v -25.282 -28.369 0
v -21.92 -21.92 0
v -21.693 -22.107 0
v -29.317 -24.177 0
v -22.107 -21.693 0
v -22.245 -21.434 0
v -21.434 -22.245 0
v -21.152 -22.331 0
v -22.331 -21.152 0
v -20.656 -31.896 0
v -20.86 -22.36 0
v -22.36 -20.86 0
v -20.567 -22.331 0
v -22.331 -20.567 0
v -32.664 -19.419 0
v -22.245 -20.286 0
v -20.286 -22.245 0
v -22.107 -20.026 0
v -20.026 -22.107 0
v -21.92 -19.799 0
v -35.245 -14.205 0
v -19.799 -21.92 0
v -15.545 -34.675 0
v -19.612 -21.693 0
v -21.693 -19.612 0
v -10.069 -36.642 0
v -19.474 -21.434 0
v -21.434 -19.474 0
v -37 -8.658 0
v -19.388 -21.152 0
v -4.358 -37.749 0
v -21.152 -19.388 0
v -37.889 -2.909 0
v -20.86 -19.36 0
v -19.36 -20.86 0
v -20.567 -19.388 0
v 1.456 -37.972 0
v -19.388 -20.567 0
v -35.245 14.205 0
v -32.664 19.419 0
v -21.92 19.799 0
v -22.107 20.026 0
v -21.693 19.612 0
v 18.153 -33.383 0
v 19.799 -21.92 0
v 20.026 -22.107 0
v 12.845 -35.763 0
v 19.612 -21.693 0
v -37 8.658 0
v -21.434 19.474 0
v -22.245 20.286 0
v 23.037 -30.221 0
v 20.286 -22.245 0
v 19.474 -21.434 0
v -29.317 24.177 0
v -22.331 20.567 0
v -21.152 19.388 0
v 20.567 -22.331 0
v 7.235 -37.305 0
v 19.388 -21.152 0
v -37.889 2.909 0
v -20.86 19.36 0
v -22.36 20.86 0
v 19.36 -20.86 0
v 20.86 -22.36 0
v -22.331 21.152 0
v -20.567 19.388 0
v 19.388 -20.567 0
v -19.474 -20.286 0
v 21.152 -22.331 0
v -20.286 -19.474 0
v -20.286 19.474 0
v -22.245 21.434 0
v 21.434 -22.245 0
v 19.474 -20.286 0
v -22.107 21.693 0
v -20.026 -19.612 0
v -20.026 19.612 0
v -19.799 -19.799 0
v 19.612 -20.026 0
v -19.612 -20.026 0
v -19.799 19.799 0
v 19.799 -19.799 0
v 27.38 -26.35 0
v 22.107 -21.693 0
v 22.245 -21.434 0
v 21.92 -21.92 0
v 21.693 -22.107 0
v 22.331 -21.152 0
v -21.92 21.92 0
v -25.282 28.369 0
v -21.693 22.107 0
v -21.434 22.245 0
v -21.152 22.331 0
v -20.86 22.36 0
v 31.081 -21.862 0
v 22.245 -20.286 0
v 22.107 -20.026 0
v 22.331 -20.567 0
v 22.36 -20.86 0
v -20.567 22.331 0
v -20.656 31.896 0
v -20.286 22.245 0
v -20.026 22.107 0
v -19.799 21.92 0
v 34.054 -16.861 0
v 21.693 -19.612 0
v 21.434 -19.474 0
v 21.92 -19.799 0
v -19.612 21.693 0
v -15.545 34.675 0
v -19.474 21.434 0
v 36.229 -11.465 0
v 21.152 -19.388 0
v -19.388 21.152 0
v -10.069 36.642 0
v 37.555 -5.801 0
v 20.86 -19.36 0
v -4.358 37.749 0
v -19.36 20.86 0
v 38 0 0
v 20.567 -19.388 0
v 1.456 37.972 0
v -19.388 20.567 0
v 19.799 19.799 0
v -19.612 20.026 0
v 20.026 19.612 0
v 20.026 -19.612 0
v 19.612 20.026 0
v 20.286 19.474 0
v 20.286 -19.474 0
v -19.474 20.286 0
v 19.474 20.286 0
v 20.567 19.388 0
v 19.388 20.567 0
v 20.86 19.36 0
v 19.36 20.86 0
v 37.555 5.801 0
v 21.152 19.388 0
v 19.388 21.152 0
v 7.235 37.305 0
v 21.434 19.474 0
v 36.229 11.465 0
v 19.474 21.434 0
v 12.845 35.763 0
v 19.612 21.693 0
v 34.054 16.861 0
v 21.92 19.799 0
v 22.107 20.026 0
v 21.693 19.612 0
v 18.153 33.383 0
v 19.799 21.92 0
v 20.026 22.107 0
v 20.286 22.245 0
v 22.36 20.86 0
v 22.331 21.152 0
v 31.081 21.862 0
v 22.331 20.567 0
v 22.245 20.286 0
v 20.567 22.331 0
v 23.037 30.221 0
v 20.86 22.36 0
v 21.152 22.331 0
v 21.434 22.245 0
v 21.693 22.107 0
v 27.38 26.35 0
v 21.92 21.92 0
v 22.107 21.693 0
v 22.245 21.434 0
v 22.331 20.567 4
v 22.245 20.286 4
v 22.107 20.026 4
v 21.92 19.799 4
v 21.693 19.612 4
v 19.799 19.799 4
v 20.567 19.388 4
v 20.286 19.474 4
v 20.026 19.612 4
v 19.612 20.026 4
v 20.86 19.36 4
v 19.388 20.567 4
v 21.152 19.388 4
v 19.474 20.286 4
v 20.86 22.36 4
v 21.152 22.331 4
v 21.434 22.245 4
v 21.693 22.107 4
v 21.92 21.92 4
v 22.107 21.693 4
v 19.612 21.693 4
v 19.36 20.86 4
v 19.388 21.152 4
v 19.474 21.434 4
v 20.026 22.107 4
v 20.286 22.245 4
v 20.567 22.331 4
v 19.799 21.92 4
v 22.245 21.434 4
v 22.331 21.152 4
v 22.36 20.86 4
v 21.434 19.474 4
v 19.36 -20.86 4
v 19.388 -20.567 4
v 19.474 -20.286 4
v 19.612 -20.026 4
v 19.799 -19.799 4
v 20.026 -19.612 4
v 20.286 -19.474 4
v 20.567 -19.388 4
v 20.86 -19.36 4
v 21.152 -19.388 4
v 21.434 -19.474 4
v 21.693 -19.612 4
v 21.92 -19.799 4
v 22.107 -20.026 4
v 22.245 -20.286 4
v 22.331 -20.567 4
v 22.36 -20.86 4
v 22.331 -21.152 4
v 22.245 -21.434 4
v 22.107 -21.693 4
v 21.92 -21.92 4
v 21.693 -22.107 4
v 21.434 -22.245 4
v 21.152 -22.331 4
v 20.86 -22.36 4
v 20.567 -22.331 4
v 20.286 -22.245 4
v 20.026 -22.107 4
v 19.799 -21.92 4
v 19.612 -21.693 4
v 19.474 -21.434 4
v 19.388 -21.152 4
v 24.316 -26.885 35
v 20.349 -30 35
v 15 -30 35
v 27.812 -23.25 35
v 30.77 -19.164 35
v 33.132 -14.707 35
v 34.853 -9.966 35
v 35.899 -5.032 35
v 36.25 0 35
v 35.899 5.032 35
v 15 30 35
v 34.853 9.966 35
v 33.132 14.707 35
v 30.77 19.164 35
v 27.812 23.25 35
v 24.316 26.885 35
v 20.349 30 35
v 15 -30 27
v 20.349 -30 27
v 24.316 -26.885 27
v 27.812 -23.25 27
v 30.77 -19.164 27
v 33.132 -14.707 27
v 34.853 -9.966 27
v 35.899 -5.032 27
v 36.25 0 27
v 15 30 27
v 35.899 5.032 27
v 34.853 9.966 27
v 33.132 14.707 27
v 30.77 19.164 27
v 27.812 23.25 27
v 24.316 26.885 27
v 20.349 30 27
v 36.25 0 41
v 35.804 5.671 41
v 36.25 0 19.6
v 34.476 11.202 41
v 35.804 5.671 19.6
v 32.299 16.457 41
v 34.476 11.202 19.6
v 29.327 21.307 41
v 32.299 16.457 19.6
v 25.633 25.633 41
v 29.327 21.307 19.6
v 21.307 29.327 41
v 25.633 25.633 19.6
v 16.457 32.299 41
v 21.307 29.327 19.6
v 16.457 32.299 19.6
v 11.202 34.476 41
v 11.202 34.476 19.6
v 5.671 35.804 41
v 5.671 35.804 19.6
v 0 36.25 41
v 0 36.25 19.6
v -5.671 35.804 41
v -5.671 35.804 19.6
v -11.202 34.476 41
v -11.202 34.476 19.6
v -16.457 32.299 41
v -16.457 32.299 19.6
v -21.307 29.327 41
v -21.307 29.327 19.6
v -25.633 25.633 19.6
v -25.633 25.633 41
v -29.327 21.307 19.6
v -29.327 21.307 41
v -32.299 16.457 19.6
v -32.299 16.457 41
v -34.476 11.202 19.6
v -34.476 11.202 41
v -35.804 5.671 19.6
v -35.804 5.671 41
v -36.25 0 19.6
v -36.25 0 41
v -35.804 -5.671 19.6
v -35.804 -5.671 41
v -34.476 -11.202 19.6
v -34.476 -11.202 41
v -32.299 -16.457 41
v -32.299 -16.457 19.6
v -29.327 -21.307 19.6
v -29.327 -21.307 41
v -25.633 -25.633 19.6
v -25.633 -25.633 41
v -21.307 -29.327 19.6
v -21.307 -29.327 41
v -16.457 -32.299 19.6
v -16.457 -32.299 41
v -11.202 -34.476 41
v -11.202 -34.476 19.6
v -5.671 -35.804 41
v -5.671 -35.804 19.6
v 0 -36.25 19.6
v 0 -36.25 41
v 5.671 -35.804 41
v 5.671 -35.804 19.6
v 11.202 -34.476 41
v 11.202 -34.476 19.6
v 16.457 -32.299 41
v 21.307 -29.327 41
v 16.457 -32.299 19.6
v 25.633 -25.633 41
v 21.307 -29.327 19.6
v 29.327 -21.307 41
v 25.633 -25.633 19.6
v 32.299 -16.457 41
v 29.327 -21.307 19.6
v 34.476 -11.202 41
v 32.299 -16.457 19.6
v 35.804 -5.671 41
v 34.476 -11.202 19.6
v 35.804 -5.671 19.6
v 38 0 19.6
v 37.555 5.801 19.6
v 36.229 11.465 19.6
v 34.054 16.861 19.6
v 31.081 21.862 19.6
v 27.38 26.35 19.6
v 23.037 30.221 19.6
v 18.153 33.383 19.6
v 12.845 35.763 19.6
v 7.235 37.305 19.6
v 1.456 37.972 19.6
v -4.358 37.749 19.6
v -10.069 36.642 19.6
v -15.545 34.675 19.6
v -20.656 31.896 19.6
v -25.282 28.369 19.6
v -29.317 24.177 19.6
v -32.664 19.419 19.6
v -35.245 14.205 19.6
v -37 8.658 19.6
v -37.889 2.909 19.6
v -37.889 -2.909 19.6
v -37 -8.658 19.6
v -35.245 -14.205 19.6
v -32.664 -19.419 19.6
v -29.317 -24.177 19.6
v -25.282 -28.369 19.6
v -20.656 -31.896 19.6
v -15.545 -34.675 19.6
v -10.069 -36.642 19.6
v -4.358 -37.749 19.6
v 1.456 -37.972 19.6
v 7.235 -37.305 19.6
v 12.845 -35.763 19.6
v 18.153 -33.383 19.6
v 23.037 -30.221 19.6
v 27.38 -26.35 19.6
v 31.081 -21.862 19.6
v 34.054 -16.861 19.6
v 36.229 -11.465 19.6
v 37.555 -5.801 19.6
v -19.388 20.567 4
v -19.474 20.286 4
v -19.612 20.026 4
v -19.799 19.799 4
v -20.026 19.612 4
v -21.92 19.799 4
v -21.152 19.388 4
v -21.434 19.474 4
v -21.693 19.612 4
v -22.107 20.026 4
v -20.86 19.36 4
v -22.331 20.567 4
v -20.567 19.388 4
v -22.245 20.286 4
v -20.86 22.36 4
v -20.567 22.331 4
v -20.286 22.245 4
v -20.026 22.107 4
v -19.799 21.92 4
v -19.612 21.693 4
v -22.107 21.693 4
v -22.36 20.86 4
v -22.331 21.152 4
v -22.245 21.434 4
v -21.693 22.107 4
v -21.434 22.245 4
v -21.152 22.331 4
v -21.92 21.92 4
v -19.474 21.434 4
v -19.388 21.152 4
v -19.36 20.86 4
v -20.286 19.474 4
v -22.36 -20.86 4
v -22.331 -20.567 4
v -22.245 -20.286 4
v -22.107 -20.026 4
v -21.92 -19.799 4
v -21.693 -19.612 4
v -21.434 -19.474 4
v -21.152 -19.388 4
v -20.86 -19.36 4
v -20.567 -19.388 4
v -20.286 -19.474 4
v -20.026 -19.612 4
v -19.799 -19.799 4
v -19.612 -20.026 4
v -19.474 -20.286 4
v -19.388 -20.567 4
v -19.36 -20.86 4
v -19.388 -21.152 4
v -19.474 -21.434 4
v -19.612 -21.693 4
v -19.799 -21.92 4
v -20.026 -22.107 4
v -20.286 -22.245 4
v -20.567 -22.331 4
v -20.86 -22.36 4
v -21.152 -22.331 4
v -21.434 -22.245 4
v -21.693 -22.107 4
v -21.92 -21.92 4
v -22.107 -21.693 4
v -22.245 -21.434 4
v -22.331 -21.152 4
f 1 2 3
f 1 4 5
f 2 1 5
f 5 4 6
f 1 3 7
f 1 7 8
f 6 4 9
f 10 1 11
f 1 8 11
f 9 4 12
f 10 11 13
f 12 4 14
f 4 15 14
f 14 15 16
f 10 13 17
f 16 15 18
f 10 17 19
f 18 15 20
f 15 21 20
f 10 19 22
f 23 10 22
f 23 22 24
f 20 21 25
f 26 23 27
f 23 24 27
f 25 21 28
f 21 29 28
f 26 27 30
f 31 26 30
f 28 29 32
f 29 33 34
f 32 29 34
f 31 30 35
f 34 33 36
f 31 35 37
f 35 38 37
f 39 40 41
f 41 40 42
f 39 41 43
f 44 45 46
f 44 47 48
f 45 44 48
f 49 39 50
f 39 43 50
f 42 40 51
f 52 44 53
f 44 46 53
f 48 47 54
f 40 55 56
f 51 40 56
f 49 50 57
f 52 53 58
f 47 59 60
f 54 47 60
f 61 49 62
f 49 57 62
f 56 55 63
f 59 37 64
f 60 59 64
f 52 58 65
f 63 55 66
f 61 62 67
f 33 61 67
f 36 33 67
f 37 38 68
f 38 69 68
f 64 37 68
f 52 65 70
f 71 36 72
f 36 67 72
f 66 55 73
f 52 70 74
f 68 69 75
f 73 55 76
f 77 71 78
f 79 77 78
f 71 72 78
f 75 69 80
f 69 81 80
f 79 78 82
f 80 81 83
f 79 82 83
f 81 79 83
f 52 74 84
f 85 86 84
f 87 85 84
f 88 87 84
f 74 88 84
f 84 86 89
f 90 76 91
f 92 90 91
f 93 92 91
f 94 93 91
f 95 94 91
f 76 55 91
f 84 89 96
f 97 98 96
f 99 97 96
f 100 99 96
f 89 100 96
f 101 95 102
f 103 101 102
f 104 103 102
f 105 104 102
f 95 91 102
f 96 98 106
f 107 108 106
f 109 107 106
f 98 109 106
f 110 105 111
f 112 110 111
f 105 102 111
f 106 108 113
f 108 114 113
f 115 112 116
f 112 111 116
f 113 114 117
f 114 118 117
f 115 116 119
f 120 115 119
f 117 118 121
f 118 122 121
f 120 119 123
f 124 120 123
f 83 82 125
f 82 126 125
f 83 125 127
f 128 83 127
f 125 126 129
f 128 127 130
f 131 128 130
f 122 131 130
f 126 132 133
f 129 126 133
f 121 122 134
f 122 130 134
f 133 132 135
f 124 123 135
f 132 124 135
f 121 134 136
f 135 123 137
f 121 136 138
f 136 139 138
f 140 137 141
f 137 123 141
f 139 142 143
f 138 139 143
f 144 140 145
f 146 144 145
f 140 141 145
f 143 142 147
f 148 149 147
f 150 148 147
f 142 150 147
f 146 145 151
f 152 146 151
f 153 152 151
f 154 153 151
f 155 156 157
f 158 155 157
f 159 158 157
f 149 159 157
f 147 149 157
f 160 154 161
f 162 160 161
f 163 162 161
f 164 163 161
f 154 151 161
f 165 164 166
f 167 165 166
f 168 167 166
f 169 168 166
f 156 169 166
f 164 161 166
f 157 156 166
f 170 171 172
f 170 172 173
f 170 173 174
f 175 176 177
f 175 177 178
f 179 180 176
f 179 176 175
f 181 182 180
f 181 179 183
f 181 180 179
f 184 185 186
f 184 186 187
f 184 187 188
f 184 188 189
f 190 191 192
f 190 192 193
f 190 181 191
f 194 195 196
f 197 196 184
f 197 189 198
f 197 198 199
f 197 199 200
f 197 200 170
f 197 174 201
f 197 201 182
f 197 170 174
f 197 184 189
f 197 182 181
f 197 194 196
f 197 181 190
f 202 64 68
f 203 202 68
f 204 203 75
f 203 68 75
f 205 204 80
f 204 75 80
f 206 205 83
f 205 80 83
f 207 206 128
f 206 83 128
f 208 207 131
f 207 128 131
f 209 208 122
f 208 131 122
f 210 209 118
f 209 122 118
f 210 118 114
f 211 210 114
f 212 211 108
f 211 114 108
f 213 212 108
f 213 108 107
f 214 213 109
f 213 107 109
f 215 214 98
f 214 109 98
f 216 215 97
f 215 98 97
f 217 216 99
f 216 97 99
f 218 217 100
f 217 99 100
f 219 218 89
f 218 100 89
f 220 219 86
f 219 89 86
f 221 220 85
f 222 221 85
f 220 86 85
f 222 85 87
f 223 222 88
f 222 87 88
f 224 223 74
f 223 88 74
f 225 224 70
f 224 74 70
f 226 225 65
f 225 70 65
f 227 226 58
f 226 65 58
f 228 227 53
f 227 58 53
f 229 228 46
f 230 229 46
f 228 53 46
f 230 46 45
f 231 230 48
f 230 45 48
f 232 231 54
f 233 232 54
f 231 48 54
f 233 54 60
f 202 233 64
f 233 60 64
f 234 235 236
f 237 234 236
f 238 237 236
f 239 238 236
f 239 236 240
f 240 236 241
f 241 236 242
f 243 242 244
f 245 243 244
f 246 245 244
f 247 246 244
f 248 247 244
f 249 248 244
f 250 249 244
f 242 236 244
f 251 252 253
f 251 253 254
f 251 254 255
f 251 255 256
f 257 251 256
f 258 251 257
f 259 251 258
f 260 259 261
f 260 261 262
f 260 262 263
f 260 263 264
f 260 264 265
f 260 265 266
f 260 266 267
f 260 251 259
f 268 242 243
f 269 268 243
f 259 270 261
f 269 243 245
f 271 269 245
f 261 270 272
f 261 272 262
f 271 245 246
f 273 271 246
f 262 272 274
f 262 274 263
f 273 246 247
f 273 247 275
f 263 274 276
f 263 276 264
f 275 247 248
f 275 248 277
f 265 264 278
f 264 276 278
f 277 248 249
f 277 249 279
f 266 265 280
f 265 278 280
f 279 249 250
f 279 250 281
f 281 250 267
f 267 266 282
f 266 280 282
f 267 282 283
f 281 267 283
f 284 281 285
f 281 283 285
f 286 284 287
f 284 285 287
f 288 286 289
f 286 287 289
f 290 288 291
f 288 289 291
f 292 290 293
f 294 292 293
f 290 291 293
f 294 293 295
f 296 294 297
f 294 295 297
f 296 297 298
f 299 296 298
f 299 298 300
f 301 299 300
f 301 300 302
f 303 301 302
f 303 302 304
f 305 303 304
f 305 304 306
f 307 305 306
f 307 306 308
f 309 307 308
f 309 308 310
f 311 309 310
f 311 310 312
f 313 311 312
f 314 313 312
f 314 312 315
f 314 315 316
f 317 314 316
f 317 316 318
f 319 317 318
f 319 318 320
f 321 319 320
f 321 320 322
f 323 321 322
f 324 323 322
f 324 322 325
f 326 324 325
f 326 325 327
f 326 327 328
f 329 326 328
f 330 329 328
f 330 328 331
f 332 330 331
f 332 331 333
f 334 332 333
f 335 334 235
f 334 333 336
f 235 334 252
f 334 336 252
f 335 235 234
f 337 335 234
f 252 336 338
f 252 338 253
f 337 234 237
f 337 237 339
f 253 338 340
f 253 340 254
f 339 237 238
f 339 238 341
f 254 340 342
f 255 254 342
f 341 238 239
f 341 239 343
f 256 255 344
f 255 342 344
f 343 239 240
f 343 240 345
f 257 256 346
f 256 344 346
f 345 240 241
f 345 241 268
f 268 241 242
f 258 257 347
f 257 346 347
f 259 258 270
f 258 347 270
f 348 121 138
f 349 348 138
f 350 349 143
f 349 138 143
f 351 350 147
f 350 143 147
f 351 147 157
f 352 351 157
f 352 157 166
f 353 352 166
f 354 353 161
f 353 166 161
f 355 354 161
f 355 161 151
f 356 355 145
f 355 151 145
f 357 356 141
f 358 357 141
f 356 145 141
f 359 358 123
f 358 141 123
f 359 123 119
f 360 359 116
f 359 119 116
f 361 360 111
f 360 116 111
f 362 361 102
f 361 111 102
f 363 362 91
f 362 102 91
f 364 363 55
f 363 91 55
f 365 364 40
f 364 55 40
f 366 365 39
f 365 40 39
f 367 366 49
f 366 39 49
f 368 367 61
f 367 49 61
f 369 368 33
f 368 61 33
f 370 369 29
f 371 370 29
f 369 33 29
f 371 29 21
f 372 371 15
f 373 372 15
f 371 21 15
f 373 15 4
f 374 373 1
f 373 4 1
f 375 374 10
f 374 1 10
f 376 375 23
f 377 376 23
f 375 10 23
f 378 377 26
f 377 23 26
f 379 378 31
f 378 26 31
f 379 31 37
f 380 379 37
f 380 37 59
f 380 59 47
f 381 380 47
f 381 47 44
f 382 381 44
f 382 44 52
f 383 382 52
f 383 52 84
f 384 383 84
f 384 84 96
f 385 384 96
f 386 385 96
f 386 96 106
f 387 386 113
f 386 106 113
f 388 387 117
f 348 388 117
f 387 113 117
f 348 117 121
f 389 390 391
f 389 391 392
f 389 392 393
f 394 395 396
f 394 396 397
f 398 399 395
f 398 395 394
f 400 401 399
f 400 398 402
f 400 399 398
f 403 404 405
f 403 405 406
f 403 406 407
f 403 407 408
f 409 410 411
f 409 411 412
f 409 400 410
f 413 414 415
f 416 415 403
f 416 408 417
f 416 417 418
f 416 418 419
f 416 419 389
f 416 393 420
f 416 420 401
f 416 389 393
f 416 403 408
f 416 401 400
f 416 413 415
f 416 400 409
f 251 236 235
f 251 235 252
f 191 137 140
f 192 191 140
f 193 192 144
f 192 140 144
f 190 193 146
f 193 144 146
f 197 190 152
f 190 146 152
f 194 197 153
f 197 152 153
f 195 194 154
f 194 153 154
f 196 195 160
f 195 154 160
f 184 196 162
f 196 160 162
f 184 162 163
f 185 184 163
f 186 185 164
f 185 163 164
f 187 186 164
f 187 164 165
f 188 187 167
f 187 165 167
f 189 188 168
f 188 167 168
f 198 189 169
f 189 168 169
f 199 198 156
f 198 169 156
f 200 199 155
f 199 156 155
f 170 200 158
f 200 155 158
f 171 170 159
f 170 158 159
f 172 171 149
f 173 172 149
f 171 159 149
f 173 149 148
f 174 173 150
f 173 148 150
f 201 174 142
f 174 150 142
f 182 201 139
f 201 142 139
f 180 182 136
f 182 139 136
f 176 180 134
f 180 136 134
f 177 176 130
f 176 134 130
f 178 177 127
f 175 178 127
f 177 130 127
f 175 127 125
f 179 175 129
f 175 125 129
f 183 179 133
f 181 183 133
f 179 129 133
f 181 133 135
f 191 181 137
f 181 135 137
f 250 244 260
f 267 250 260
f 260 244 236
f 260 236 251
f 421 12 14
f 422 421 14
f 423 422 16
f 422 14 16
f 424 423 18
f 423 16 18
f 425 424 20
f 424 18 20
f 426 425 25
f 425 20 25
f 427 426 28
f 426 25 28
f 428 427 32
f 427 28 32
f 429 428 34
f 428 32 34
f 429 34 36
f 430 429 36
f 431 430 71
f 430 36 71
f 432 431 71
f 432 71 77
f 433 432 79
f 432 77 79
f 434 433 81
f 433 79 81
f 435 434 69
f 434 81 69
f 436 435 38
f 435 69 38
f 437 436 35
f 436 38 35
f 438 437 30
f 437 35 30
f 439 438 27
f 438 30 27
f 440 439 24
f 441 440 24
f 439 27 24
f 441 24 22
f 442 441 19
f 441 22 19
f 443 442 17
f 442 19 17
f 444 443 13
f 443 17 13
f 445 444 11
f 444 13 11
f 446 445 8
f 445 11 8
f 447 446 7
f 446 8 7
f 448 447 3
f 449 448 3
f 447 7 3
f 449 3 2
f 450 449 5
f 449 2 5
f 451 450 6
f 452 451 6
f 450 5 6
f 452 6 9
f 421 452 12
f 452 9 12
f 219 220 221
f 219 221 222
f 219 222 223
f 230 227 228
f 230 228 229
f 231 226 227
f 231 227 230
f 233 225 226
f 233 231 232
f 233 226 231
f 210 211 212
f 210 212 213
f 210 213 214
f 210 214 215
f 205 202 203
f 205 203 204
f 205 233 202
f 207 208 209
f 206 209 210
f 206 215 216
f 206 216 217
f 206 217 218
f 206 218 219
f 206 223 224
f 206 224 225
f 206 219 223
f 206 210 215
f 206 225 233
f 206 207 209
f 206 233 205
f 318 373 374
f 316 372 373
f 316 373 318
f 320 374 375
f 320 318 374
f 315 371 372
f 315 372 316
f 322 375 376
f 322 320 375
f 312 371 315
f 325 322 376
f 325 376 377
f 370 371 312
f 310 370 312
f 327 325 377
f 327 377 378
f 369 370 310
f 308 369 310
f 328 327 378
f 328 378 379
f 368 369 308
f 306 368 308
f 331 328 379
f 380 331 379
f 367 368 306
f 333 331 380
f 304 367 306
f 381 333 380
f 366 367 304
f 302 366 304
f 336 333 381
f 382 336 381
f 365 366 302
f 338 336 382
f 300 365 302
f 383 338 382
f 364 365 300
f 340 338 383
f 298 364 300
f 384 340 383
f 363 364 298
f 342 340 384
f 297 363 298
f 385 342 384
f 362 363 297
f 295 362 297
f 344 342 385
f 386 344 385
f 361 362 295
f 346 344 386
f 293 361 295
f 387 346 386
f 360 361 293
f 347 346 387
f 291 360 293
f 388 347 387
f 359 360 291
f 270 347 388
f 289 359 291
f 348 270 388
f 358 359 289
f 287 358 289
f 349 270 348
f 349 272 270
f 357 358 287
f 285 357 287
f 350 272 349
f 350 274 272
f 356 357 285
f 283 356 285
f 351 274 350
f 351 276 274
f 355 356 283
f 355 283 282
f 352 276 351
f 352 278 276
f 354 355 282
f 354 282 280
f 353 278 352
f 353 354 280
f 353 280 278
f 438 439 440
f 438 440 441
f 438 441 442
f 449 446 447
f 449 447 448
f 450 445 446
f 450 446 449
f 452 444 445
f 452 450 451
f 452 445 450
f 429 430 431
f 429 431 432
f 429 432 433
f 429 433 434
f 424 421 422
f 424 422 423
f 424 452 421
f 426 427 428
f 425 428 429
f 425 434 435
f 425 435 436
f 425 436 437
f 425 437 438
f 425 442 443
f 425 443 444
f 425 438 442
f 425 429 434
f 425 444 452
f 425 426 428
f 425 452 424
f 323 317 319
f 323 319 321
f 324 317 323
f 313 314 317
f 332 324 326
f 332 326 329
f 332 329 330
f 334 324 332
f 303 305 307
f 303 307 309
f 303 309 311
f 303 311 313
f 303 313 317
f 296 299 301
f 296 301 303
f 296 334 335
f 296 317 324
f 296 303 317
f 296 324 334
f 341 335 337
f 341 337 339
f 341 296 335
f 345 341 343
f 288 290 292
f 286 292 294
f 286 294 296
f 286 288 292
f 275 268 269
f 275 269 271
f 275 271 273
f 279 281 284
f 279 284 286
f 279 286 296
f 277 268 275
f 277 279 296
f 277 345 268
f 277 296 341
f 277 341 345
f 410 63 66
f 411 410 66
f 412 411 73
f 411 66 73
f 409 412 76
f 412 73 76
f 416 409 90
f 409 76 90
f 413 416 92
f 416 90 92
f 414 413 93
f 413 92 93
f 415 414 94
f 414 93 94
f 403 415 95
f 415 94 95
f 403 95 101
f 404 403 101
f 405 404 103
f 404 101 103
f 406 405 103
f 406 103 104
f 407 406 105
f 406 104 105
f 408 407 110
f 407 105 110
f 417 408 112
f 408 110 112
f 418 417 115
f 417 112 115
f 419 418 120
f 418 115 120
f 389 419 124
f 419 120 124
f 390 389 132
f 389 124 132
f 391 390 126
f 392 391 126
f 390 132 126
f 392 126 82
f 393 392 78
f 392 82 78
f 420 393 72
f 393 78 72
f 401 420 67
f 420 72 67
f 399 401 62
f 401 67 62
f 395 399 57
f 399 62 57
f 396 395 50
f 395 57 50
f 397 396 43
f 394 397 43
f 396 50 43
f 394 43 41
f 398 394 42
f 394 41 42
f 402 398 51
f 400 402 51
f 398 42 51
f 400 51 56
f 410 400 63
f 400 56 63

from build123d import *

# Parameters (mm, degrees)
SKETCH_1_R          = 38
EXTRUDE_1_DEPTH     = 19.6
SKETCH_2_R          = 36.25
EXTRUDE_2_DEPTH     = 21.4
SKETCH_3_R          = 1.5
CUT_EXTRUDE_1_DEPTH = 4
CUT_EXTRUDE_2_REACH = 55
CUT_EXTRUDE_START   = 15
SKETCH_5_W          = 8
SKETCH_5_H          = 60


with BuildPart() as part:
    # 草图1 → 凸台-拉伸1 (new body)
    with BuildSketch(Plane.XY):
        Circle(SKETCH_1_R)
    extrude(amount=EXTRUDE_1_DEPTH)

    # 草图2 → 凸台-拉伸2 (add)
    with BuildSketch(Plane.XY.offset(19.6)):
        Circle(SKETCH_2_R)
    extrude(amount=EXTRUDE_2_DEPTH)

    # 草图3 → 切除-拉伸1 (cut)
    with BuildSketch(Plane(origin=(0, 0, 0), x_dir=(-1, 0, 0), z_dir=(0, 0, -1))):
        with Locations((20.859650045, 20.859650045)):
            Circle(SKETCH_3_R)
        with Locations((20.859650045, -20.859650045)):
            Circle(SKETCH_3_R)
        with Locations((-20.859650045, -20.859650045)):
            Circle(SKETCH_3_R)
        with Locations((-20.859650045, 20.859650045)):
            Circle(SKETCH_3_R)
    extrude(amount=-CUT_EXTRUDE_1_DEPTH, mode=Mode.SUBTRACT)

    # 草图5 → 切除-拉伸2 (cut, up to next)
    with BuildSketch(Plane(origin=(0, 0, 0), x_dir=(0, 0, -1), z_dir=(1, 0, 0)).offset(CUT_EXTRUDE_START), mode=Mode.PRIVATE) as cut_extrude_2_sk1:
        with Locations((-31, 0)):
            Rectangle(SKETCH_5_W, SKETCH_5_H)
    cut_extrude_2_tool1 = extrude(cut_extrude_2_sk1.sketch, amount=CUT_EXTRUDE_2_REACH, mode=Mode.PRIVATE) & part.part
    add(cut_extrude_2_tool1.solids().sort_by_distance((15, 0, 31))[0], mode=Mode.SUBTRACT)


solid = part.part
